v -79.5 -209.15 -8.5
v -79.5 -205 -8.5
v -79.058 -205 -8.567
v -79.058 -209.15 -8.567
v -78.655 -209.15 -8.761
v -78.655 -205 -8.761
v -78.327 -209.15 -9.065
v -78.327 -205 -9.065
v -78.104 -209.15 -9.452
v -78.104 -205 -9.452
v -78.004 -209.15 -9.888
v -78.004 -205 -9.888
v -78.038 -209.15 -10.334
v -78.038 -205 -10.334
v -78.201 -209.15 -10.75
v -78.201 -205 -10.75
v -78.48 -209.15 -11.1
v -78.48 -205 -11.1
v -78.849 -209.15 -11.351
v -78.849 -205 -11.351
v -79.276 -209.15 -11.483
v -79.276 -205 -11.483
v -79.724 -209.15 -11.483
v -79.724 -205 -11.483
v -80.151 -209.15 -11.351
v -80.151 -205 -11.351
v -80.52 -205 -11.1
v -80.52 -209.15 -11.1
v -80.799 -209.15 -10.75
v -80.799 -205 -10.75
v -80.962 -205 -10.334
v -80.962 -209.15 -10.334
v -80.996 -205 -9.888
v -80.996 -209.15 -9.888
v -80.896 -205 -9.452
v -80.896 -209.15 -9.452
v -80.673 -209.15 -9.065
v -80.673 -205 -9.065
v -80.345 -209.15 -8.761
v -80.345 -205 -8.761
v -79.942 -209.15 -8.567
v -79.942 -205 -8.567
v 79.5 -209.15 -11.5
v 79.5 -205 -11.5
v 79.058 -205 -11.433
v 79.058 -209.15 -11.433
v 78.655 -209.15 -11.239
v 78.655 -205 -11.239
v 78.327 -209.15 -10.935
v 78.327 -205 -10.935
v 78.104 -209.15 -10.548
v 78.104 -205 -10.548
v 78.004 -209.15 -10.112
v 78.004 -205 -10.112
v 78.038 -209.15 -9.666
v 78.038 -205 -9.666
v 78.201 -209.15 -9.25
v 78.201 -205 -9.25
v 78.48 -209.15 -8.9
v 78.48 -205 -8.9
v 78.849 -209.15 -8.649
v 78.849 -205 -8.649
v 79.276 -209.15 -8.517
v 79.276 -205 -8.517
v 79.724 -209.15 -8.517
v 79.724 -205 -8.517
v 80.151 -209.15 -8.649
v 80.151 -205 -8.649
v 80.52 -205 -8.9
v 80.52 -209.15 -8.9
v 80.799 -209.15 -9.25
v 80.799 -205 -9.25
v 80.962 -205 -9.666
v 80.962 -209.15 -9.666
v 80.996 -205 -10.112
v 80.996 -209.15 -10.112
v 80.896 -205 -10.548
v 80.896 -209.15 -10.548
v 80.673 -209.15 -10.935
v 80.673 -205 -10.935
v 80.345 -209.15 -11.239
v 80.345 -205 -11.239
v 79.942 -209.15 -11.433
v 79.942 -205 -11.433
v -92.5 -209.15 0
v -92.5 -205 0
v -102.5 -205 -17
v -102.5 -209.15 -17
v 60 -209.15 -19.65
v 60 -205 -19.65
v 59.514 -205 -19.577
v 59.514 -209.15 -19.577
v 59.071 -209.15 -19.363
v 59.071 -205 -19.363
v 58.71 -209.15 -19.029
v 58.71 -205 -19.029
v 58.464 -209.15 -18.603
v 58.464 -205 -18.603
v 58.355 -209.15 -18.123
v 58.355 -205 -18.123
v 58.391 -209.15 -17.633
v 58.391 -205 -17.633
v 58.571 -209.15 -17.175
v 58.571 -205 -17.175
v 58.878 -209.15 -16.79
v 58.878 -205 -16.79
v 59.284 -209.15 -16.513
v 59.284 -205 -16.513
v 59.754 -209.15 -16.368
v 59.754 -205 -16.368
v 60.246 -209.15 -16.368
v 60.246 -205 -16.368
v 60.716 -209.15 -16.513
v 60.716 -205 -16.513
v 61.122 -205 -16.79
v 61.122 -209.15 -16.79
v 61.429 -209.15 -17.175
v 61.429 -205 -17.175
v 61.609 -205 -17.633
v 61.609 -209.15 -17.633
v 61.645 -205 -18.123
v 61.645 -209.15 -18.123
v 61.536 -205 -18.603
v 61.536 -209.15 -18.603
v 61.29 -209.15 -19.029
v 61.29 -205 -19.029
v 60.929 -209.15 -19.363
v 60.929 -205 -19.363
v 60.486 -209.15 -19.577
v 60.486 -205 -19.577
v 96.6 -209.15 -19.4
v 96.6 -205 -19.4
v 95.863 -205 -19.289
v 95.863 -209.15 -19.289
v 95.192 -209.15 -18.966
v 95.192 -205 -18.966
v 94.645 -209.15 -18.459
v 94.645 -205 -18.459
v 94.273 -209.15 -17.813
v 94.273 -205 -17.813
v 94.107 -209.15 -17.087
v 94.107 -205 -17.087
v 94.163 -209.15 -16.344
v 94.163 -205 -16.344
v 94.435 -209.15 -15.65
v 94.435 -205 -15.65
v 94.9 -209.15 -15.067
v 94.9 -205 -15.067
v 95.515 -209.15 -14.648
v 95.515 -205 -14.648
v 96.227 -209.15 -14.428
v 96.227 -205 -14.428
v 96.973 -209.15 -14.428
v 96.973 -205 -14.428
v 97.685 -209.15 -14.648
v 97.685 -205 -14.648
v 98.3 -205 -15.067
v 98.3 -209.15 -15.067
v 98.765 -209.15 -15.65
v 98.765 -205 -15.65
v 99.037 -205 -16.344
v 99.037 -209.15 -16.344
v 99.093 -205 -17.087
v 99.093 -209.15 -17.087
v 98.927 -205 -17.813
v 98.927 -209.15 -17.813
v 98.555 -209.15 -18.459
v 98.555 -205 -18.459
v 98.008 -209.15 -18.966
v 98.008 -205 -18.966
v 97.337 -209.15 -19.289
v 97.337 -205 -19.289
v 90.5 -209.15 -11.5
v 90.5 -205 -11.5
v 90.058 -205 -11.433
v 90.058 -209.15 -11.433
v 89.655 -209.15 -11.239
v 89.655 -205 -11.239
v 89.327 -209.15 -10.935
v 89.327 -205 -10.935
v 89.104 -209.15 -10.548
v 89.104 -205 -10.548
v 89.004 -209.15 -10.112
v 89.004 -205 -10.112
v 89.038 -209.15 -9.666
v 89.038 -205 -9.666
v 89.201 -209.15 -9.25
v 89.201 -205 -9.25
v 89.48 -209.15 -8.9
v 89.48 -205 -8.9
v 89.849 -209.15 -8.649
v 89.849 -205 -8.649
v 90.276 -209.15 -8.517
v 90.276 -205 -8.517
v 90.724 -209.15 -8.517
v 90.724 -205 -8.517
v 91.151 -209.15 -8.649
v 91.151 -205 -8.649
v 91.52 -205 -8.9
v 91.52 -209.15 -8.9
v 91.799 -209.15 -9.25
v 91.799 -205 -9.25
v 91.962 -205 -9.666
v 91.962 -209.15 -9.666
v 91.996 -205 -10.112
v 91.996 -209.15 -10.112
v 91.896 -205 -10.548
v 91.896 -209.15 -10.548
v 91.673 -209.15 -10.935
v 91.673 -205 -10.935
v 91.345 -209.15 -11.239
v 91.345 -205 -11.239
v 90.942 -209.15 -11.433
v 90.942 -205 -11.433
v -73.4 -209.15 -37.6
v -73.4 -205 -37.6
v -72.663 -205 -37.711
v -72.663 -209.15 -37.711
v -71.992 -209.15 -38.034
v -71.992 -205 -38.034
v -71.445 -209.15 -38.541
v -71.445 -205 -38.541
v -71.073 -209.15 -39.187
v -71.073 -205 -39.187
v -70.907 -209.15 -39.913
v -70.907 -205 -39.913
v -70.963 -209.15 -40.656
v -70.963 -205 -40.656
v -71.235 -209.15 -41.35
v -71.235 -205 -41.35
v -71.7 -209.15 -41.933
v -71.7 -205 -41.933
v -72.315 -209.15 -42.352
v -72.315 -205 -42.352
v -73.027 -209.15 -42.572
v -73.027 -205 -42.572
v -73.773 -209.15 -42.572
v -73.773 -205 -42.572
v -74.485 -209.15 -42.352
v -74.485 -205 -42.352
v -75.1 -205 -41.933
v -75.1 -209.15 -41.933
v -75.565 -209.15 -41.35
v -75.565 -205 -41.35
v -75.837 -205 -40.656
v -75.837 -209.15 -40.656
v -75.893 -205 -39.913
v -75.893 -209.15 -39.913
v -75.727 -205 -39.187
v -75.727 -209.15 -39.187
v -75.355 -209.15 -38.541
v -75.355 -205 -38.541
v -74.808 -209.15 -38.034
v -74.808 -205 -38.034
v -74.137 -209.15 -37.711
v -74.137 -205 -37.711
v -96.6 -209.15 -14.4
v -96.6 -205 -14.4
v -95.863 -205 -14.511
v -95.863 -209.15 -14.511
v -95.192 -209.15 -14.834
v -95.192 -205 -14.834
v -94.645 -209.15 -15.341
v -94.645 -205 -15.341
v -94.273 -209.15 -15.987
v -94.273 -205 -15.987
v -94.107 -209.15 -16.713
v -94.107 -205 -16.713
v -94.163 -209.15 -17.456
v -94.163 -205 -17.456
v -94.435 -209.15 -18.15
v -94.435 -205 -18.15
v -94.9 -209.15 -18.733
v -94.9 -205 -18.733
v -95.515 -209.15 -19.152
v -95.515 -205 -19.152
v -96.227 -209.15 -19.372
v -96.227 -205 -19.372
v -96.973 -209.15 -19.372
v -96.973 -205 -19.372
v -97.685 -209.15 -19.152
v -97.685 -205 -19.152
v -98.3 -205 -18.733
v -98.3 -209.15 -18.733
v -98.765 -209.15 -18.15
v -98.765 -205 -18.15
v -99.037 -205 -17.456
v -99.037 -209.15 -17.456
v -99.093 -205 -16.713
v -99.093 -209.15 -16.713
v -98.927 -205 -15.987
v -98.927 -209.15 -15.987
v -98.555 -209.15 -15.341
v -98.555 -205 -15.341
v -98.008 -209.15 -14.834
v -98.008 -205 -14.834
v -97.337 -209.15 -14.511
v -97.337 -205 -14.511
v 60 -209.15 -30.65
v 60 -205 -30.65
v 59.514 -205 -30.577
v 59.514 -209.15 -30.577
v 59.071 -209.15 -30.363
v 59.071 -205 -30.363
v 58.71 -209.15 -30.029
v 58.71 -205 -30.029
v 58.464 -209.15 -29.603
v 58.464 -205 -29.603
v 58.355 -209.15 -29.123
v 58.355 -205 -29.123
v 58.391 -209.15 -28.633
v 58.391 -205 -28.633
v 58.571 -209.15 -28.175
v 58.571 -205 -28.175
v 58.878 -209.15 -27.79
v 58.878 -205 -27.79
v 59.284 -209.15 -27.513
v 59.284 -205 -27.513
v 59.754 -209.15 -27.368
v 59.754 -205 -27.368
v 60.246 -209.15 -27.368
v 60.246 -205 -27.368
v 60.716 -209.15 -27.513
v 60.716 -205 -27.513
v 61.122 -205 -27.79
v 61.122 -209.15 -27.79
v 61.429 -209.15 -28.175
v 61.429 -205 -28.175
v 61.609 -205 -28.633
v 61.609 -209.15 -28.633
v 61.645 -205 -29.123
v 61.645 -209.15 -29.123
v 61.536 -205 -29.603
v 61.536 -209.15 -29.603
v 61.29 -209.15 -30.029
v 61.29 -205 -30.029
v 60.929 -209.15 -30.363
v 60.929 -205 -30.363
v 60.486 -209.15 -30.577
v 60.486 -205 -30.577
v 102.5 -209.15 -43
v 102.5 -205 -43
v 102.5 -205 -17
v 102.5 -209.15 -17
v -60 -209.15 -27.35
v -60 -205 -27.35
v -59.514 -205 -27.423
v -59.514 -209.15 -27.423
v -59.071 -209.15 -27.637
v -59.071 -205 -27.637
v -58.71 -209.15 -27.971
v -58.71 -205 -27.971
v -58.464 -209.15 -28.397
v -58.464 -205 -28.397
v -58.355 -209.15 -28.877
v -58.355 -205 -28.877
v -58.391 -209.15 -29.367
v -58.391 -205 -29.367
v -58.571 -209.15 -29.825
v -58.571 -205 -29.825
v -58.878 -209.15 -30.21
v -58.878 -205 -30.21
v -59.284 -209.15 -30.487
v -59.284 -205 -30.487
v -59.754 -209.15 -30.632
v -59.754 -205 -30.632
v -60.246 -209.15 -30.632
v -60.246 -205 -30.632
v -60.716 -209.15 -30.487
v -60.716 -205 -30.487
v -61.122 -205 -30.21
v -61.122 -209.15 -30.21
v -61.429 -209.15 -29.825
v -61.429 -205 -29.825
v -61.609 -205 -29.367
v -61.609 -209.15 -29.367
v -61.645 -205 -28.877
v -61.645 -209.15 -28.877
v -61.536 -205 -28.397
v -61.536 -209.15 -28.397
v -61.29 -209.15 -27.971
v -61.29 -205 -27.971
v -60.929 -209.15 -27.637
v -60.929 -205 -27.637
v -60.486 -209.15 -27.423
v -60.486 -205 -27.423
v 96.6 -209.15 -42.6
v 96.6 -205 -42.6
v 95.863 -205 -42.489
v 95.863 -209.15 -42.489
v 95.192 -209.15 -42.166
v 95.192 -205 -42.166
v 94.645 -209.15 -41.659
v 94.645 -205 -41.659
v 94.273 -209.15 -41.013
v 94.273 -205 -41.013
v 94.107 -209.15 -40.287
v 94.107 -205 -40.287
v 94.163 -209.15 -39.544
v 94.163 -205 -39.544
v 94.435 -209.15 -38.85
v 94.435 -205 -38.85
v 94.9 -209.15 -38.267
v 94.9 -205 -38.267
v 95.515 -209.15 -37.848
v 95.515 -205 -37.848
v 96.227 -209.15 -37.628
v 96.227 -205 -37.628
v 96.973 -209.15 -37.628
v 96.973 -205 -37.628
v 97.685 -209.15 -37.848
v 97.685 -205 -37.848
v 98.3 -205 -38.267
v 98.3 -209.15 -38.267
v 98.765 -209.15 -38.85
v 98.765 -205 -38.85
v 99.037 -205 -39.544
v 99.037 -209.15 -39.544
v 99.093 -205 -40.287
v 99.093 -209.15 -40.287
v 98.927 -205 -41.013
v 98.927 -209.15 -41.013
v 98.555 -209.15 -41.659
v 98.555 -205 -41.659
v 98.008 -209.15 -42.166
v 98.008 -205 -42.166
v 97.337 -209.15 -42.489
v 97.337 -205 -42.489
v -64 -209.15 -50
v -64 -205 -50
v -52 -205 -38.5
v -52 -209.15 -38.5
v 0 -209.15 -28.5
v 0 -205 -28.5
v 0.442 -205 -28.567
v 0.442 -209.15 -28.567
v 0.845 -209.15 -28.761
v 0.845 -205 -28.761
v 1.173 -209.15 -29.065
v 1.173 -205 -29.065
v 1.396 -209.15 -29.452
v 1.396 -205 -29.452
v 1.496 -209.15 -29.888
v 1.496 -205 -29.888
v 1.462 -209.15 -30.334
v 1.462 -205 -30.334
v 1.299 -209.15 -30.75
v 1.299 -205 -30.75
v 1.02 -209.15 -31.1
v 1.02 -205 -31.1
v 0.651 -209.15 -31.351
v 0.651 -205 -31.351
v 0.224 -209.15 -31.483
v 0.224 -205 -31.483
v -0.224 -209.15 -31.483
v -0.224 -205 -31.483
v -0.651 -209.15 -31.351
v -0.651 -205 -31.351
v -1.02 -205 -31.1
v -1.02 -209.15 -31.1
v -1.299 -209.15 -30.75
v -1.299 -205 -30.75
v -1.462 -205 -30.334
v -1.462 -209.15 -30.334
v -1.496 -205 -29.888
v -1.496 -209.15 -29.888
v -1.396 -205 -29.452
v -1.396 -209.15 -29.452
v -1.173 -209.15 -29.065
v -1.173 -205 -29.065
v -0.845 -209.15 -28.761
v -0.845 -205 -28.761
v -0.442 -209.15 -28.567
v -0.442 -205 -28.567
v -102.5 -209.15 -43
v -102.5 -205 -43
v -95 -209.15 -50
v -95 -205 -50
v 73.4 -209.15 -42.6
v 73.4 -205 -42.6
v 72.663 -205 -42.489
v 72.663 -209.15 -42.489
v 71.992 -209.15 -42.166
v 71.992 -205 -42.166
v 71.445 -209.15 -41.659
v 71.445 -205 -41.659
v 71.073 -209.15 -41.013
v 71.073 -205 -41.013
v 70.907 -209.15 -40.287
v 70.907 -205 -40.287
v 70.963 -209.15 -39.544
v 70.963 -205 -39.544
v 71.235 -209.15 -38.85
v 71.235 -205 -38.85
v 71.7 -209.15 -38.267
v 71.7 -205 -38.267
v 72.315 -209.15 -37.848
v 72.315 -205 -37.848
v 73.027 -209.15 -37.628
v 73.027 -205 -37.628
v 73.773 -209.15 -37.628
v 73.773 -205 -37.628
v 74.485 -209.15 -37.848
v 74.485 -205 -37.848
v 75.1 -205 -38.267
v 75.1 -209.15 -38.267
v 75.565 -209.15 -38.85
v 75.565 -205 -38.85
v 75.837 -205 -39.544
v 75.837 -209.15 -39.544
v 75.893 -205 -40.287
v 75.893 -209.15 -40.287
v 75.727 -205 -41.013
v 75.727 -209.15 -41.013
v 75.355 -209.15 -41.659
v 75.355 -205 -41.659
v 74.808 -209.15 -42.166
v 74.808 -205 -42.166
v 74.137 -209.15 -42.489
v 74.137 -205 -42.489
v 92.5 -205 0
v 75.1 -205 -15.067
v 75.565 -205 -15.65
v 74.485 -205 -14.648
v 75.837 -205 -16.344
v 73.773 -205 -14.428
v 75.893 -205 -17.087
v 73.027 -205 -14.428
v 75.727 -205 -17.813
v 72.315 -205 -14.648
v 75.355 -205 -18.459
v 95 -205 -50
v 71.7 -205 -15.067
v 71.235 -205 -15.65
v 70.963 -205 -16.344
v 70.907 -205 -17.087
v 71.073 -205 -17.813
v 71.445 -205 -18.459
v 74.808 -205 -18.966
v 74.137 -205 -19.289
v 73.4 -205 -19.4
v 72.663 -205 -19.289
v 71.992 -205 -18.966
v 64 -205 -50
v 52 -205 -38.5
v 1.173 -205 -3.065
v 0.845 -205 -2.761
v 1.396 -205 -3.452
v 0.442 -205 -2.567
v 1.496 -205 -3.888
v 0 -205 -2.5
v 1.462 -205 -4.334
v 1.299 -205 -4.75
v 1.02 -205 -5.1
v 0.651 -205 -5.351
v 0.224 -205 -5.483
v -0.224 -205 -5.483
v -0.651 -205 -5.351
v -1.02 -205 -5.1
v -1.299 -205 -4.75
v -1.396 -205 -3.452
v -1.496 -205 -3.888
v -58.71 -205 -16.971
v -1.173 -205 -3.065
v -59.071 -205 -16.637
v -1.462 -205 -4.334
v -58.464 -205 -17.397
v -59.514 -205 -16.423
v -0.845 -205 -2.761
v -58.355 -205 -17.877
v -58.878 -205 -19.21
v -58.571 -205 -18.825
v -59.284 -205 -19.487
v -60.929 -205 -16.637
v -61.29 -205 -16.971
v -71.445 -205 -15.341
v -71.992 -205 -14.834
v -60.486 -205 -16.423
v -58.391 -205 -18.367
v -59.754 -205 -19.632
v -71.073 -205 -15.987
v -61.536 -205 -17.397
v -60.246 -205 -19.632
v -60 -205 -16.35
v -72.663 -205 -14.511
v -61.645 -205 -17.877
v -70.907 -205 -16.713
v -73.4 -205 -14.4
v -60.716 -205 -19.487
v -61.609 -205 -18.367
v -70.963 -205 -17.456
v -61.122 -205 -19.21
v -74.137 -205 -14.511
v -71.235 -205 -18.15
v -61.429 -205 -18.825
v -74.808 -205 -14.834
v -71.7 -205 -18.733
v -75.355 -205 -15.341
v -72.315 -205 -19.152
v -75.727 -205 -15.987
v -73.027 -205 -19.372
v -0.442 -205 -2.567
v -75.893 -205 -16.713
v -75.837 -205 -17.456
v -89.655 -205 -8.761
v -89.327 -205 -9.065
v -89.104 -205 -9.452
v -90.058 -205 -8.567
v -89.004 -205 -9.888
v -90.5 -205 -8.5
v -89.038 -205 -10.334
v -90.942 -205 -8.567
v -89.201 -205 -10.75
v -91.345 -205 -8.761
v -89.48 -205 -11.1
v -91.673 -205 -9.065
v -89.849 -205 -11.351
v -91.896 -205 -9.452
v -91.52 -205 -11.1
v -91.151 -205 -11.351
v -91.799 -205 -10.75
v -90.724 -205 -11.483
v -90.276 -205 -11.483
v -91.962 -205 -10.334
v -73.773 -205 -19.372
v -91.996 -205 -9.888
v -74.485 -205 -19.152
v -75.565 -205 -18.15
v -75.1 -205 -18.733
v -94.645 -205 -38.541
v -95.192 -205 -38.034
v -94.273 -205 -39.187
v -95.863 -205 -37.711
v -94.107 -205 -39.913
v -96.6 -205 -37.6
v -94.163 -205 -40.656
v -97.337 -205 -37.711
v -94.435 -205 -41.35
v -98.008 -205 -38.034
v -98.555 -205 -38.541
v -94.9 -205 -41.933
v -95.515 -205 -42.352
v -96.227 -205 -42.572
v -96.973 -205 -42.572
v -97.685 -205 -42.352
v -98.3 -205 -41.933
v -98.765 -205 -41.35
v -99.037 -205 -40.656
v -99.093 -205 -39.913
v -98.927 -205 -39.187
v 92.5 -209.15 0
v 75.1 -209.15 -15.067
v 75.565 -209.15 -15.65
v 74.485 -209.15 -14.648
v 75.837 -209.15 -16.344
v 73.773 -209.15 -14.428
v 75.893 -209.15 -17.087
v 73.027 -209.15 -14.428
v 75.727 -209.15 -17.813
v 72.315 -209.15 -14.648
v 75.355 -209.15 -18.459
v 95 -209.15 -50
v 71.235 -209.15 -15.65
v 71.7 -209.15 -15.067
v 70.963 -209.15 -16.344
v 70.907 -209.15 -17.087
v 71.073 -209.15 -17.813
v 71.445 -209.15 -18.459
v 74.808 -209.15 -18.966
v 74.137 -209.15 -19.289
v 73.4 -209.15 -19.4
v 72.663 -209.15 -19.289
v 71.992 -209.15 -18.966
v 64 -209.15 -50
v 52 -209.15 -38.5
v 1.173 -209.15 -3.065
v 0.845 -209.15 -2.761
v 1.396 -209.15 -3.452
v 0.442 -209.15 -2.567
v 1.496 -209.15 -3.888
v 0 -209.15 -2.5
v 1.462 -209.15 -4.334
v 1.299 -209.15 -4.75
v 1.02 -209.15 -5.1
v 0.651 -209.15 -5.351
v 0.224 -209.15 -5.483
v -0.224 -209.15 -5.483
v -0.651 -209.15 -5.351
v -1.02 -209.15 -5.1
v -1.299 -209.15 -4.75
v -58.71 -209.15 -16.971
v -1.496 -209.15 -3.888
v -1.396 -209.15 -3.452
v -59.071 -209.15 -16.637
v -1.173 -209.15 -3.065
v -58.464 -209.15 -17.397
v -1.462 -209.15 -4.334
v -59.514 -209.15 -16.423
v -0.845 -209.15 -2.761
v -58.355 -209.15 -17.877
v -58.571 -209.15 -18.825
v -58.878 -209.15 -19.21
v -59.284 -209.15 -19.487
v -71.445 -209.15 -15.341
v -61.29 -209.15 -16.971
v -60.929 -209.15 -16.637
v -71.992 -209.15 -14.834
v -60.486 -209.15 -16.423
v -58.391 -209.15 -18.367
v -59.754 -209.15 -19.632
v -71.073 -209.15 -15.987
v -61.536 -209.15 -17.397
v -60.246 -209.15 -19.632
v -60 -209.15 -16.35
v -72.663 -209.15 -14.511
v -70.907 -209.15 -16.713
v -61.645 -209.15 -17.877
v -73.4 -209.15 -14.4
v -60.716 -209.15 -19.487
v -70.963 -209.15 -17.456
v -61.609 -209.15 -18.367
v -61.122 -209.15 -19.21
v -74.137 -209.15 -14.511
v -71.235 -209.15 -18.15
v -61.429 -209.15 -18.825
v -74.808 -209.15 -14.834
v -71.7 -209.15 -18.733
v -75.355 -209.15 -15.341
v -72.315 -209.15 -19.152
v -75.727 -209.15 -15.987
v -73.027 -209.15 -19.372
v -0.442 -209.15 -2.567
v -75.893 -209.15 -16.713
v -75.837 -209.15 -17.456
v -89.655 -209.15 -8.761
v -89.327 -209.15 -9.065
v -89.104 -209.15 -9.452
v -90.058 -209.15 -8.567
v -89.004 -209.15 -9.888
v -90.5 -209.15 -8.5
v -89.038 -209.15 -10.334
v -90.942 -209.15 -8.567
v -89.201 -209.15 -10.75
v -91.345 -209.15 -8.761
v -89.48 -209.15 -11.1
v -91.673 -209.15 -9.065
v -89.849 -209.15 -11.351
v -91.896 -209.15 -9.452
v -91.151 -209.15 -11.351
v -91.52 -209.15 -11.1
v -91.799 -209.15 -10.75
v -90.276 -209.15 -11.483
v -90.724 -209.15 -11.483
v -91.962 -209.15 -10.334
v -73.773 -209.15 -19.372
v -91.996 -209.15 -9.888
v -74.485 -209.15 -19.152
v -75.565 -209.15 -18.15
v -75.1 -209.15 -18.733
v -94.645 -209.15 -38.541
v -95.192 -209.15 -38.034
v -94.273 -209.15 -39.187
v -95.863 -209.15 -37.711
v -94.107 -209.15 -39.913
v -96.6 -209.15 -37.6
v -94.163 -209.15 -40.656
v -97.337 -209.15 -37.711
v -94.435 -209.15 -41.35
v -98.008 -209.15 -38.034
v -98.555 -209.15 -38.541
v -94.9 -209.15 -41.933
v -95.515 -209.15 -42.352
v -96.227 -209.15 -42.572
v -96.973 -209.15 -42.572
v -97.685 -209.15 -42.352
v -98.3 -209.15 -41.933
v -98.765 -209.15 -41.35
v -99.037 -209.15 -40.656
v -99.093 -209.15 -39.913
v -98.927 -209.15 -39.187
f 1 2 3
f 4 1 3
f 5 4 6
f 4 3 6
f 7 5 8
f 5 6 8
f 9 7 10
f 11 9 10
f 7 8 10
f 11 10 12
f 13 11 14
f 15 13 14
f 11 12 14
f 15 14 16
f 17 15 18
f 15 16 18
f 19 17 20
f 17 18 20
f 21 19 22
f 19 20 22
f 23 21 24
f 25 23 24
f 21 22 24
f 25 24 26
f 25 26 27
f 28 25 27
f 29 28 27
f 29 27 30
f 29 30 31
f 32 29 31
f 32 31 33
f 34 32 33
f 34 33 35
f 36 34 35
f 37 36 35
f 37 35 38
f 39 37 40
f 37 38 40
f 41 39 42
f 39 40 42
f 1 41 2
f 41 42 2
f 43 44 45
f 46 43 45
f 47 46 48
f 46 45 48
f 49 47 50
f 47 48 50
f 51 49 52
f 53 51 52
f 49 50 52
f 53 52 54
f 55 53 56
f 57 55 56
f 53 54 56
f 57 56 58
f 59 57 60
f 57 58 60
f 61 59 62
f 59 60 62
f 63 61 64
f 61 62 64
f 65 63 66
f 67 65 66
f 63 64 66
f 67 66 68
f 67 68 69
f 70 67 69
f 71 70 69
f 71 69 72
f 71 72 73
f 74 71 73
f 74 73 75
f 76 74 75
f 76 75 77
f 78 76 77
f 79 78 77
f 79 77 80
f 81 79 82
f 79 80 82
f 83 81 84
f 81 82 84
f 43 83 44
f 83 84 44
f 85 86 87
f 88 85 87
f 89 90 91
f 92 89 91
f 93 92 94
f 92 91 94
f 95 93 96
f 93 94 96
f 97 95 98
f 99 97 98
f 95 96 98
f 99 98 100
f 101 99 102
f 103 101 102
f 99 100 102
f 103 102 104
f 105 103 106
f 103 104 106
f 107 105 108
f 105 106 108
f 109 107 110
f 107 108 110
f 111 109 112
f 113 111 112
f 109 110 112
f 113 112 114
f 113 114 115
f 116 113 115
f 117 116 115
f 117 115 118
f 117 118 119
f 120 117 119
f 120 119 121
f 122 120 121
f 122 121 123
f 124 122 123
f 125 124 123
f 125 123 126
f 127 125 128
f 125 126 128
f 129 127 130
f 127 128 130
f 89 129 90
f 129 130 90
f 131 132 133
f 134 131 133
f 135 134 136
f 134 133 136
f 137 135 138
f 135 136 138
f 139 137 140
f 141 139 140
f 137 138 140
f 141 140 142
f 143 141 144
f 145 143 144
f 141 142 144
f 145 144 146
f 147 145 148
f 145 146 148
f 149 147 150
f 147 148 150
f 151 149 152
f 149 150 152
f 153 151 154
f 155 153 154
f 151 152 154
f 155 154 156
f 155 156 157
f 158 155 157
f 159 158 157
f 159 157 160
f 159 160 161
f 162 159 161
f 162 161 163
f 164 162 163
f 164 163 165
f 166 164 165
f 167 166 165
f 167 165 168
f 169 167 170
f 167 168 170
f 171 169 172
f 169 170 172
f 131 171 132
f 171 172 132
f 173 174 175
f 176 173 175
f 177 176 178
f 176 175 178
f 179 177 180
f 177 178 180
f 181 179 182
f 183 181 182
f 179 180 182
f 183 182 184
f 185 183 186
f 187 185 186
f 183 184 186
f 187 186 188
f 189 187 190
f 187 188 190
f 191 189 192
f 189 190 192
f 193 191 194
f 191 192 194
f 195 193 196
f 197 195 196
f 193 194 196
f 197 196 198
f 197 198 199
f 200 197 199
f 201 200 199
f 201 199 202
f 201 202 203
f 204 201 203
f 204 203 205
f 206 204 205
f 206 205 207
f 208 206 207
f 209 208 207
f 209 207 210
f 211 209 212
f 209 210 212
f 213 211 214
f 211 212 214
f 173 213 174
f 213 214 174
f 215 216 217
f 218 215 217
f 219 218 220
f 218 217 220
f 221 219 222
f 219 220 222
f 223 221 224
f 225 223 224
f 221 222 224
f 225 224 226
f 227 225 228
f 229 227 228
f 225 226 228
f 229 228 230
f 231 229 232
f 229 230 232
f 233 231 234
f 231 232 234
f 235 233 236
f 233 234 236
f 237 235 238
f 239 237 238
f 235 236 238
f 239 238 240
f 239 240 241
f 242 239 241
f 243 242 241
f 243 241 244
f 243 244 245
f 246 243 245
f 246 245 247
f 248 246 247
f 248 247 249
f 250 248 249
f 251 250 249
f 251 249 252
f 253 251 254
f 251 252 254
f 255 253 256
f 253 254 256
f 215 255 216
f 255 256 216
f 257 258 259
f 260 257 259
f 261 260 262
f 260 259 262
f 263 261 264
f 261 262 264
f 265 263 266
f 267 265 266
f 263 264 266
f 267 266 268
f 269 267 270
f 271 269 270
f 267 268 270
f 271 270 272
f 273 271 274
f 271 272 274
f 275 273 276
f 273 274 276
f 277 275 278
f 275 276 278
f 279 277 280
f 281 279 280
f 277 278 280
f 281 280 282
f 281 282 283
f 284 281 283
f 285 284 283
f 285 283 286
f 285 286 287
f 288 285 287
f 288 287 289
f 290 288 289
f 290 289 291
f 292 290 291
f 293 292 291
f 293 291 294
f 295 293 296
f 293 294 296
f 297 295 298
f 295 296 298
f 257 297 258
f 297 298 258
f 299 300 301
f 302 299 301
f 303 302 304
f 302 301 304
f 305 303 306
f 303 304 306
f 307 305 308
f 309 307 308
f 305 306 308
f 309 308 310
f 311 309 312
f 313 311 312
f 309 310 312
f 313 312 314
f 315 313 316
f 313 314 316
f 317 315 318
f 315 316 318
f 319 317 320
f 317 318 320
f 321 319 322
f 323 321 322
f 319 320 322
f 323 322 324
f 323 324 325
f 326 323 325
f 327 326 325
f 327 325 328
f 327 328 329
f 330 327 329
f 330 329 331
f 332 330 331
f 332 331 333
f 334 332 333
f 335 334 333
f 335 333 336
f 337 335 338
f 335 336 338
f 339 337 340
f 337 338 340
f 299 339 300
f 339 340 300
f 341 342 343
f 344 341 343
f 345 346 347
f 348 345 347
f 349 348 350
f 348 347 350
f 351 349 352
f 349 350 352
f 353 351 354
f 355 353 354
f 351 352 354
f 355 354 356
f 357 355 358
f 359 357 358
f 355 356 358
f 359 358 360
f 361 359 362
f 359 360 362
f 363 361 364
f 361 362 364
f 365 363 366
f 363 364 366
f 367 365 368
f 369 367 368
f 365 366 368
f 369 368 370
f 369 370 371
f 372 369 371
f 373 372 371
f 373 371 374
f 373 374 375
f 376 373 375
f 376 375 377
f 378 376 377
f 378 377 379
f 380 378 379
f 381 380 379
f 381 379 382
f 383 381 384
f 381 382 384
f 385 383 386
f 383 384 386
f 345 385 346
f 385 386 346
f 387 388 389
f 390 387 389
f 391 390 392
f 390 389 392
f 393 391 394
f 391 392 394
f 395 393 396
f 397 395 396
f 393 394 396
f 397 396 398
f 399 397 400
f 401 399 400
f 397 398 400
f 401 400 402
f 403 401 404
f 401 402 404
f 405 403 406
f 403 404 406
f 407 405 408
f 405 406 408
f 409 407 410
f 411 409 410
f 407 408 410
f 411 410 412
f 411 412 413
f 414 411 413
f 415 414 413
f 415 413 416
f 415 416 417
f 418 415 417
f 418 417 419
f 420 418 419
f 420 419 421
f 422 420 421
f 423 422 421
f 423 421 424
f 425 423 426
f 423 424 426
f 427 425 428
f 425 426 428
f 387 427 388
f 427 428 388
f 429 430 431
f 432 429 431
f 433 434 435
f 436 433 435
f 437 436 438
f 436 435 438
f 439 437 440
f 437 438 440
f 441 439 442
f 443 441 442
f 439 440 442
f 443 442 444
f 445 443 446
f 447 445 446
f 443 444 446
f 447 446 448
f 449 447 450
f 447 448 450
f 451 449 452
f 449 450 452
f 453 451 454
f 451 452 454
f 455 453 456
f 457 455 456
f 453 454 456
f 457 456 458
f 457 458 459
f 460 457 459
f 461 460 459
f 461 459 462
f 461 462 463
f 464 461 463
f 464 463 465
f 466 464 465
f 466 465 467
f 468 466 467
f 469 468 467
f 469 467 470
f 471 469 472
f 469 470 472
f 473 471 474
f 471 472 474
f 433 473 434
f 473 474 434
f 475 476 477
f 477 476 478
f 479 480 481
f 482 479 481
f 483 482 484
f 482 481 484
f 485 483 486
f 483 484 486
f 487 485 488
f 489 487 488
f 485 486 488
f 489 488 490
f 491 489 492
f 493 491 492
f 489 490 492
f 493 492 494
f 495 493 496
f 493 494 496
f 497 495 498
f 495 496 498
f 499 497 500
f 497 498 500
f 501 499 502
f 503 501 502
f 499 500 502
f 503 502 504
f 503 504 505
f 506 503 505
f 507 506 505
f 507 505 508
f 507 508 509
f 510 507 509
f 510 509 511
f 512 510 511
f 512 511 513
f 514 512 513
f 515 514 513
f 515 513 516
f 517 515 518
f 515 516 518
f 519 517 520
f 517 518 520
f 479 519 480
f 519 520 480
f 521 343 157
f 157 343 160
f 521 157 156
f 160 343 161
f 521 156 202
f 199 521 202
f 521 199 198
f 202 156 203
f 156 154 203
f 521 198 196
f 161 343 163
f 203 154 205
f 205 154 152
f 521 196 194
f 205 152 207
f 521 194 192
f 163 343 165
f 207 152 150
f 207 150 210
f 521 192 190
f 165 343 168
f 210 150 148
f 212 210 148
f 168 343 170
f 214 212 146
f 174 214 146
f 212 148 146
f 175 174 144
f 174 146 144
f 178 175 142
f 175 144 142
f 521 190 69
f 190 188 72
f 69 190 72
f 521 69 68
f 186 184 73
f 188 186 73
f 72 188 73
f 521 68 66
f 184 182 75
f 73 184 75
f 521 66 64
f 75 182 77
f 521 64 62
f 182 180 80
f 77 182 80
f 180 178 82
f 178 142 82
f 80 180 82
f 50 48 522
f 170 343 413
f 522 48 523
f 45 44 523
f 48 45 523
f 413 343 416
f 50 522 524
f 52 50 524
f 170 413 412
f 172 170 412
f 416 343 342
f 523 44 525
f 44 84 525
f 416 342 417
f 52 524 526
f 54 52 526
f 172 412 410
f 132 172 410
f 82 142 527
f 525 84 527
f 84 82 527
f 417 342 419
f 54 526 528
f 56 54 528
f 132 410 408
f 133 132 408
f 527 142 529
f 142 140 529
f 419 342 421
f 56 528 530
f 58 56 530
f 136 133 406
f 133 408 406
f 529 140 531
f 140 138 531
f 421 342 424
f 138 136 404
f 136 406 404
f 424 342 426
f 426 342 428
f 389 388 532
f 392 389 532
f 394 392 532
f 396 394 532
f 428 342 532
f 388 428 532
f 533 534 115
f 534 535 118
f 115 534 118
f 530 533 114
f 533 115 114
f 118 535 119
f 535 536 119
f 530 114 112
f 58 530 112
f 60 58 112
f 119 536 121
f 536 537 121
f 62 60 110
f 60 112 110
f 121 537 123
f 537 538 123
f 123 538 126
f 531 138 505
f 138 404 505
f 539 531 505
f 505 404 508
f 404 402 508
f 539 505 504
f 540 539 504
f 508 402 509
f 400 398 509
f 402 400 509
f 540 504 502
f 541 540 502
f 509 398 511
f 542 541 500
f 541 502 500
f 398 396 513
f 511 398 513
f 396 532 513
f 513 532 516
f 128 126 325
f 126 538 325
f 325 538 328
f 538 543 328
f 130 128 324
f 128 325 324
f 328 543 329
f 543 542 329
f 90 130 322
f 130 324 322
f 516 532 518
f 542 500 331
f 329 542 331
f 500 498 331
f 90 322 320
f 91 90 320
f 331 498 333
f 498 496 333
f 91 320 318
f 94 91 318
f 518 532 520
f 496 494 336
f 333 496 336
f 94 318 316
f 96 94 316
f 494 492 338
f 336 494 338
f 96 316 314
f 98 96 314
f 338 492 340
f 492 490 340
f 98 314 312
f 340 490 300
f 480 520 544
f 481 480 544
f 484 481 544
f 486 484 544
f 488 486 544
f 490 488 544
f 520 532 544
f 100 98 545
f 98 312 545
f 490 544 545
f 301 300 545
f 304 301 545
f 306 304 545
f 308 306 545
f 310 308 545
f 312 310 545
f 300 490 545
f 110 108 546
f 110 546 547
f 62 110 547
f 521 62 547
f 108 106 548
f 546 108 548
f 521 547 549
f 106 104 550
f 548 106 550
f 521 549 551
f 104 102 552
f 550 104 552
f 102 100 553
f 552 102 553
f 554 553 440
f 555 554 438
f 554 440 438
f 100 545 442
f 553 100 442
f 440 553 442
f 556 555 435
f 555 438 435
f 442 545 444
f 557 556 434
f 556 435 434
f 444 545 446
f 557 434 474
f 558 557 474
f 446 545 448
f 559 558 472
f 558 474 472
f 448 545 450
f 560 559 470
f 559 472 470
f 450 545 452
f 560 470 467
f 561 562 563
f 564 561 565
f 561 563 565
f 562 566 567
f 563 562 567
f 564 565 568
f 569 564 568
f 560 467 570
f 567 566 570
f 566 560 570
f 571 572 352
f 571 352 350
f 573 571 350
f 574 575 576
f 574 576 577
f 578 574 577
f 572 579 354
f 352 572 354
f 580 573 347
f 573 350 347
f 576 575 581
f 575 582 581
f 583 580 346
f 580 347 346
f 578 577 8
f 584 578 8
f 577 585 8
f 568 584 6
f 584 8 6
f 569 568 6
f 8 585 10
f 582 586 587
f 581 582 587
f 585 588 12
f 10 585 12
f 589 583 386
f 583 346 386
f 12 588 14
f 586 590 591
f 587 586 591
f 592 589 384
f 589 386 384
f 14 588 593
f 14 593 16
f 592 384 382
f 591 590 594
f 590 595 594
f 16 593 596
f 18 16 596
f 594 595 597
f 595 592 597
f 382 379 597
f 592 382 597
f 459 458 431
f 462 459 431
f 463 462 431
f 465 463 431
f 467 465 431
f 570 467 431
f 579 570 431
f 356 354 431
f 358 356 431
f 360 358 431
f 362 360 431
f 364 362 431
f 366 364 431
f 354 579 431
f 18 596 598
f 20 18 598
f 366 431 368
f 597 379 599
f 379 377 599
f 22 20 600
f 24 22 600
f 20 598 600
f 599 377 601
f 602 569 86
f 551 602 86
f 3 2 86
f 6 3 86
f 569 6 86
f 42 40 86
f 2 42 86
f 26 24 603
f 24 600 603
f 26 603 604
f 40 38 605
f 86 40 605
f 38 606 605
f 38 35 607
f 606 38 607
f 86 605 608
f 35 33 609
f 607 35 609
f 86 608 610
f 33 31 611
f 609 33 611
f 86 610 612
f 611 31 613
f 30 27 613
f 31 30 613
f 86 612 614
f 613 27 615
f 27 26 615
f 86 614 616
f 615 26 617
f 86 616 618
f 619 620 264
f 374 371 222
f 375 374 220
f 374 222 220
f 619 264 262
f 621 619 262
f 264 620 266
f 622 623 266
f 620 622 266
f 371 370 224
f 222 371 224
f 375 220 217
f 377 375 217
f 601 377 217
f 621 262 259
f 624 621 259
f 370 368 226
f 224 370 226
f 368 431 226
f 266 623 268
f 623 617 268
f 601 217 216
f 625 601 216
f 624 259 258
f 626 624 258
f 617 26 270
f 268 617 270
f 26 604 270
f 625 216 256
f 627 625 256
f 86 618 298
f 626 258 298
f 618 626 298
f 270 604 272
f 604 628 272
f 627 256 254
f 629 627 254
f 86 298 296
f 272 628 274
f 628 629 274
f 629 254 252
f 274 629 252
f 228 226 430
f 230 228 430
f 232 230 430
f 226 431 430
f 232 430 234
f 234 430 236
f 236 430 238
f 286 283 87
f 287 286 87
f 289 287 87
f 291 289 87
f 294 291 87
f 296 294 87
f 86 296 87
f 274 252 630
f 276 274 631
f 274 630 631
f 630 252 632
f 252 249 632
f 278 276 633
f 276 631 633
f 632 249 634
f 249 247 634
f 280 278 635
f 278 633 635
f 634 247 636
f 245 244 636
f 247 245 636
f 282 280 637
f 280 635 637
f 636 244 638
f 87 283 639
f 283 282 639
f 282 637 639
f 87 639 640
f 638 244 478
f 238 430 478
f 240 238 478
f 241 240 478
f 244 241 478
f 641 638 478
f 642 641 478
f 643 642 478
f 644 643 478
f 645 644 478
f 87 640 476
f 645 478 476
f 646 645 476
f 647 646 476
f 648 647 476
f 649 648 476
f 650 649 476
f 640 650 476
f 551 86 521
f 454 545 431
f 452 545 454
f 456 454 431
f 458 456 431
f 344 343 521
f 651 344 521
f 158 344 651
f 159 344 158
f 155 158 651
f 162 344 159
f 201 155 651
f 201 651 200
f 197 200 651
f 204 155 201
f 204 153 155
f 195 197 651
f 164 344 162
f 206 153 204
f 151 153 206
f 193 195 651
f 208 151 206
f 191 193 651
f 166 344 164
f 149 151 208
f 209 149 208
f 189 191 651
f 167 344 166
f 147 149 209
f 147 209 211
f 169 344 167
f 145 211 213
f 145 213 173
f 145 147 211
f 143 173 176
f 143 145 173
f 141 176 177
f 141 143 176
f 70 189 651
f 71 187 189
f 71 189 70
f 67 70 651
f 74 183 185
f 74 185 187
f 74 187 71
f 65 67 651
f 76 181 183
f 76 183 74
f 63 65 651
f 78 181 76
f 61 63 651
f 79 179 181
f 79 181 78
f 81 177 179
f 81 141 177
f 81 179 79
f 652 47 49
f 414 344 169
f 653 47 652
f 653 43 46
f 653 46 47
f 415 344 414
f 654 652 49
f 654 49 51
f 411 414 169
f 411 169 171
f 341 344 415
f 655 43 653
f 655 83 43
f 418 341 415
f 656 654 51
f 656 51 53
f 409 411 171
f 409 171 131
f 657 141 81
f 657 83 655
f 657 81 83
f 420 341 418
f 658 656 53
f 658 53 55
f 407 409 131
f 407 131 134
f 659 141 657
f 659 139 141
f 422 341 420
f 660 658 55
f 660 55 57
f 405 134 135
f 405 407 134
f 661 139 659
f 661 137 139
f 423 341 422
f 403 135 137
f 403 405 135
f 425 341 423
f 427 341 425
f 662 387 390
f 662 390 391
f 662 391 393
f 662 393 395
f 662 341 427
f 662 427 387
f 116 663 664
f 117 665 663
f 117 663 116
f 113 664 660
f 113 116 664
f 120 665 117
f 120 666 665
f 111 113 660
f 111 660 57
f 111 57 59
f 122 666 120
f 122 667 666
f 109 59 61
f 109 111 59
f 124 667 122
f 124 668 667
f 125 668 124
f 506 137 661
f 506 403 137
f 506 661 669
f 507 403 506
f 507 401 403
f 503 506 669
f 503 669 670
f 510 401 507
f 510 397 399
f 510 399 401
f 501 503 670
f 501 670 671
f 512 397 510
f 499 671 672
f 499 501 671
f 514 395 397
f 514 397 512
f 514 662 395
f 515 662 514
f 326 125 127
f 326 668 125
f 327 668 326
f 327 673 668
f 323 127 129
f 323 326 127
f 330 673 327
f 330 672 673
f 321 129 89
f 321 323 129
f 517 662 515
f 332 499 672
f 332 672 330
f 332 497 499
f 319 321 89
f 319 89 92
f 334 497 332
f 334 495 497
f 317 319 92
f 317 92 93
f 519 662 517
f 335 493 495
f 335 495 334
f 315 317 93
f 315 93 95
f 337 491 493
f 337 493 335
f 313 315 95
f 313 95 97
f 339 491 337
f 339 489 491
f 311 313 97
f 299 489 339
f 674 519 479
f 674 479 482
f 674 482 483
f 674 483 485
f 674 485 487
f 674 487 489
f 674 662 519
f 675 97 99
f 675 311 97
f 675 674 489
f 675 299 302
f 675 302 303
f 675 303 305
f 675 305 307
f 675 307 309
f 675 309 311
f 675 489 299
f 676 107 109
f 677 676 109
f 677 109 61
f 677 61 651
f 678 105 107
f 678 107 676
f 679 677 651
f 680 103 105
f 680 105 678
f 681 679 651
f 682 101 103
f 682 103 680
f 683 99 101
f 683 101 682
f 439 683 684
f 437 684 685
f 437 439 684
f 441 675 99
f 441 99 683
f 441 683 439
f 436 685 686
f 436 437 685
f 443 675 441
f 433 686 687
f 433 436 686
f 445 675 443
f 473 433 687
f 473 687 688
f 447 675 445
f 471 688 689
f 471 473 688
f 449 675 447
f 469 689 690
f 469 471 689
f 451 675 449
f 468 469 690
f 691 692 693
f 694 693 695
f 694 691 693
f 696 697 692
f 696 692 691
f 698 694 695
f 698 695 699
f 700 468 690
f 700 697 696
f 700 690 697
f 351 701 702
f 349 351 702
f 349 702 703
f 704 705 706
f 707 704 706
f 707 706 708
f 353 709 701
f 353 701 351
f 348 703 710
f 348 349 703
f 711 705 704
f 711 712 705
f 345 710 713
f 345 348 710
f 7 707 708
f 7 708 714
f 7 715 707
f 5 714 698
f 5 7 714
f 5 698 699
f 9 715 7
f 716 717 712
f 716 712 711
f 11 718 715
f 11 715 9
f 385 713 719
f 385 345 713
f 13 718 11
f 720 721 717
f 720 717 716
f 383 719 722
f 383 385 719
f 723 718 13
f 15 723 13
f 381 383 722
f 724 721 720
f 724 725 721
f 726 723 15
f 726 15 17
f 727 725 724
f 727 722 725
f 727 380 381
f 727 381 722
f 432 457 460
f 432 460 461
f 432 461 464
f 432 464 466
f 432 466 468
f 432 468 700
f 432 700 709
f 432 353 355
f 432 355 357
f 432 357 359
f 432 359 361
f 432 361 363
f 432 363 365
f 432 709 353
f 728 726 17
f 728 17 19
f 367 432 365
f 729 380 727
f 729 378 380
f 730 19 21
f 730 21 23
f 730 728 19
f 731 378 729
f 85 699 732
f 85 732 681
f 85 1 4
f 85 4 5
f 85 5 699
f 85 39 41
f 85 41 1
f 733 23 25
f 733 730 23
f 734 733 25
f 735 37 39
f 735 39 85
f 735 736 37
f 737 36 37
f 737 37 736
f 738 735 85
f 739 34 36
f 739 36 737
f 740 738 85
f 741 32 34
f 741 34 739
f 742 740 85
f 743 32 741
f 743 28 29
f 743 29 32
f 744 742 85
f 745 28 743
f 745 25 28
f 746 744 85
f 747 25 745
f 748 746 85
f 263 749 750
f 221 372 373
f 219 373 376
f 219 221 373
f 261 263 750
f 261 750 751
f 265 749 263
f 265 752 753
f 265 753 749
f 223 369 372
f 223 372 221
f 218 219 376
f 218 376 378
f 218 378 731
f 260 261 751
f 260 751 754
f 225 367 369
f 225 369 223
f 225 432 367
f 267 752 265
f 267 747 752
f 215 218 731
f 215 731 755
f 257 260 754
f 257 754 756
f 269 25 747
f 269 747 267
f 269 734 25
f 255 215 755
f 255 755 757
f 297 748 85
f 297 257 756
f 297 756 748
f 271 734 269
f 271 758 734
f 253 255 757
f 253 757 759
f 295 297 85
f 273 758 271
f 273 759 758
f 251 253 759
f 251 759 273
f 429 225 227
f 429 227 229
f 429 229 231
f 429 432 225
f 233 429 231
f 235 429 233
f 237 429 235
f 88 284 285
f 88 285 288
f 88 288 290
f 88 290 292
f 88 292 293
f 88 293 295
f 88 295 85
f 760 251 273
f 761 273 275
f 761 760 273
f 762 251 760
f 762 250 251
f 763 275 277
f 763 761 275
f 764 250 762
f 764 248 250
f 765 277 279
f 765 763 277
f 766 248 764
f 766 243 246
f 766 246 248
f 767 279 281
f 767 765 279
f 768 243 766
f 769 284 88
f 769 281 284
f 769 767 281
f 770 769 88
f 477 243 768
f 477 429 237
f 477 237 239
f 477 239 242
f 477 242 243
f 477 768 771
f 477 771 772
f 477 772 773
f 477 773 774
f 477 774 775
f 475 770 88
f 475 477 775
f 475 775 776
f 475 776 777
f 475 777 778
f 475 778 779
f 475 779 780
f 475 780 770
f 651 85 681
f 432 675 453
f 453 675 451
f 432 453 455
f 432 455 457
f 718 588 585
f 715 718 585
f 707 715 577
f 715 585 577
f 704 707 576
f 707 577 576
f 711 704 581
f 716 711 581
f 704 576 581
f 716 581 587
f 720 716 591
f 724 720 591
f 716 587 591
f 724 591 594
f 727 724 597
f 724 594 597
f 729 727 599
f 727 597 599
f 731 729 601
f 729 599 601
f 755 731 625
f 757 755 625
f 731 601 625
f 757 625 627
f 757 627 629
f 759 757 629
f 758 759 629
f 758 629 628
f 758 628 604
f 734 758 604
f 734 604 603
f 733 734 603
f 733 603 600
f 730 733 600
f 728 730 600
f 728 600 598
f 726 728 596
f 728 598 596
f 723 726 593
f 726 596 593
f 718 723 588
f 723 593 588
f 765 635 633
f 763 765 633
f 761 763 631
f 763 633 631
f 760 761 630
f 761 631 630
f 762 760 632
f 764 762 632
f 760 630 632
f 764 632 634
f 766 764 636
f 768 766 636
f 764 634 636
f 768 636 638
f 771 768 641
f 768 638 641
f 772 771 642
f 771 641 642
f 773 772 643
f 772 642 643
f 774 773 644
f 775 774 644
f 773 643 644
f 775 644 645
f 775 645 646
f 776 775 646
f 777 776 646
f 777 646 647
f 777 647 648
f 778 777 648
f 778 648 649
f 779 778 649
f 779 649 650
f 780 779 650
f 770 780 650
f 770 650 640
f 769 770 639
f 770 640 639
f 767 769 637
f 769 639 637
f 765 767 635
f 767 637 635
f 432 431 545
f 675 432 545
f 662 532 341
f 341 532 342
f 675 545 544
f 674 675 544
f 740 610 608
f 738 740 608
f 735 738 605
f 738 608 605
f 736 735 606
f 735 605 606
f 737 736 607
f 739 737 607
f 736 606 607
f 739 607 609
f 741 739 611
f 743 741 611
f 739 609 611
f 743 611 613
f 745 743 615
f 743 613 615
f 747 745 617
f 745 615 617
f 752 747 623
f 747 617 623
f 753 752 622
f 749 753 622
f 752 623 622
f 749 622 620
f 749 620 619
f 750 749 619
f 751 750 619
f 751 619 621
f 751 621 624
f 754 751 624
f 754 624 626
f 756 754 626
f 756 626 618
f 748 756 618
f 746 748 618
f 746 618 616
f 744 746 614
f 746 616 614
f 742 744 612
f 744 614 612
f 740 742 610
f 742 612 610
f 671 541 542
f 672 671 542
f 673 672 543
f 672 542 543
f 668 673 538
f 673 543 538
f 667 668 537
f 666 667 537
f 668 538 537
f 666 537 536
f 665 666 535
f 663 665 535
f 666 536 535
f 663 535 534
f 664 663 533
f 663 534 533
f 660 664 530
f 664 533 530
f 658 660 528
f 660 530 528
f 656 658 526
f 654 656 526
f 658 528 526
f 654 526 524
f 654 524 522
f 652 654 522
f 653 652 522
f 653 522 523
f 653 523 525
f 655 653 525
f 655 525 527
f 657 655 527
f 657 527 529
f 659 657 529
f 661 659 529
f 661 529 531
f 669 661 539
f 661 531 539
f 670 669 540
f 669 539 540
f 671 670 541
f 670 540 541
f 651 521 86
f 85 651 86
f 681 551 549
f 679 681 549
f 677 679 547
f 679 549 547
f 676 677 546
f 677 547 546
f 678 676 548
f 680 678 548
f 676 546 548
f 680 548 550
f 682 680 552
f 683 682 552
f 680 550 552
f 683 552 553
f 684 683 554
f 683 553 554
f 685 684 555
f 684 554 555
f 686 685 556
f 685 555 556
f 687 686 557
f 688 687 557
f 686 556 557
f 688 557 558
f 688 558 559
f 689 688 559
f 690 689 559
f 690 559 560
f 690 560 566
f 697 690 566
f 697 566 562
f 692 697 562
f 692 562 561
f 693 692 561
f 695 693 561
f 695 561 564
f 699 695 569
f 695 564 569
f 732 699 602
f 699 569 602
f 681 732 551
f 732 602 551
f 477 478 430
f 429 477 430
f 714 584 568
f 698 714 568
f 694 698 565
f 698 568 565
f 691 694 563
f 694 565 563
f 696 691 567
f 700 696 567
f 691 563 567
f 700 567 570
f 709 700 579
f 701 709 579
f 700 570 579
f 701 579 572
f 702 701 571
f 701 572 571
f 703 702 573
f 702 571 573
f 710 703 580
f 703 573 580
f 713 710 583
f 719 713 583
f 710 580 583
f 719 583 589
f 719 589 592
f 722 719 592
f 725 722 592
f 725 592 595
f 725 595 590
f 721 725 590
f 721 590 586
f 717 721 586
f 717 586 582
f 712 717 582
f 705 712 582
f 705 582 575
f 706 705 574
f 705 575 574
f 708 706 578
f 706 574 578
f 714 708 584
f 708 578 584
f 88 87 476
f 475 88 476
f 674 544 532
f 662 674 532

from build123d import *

# Parameters (mm, degrees)
SKETCH1_R           = 2.5
SKETCH1_R_2         = 1.5
SKETCH1_R_3         = 1.65
BOSS_EXTRUDE1_DEPTH = 4.15


with BuildPart() as part:
    # Sketch1 → Boss-Extrude1 (new body)
    with BuildSketch(Plane(origin=(0, -205, 0), x_dir=(1, 0, 0), z_dir=(0, 1, 0))):
        Polygon((52, 38.5), (64, 50), (95, 50), (102.5, 43), (102.5, 17), (92.5, 0), (-92.5, 0), (-102.5, 17), (-102.5, 43), (-95, 50), (-64, 50), (-52, 38.5), align=None)
        with Locations(Location((-96.6, 40.1, 0), (0, 0, 270))):  # turned: the seam where the file's is
            Circle(SKETCH1_R, mode=Mode.SUBTRACT)
        with Locations(Location((-73.4, 40.1, 0), (0, 0, 270))):  # turned: the seam where the file's is
            Circle(SKETCH1_R, mode=Mode.SUBTRACT)
        with Locations(Location((-96.6, 16.9, 0), (0, 0, 270))):  # turned: the seam where the file's is
            Circle(SKETCH1_R, mode=Mode.SUBTRACT)
        with Locations(Location((-73.4, 16.9, 0), (0, 0, 270))):  # turned: the seam where the file's is
            Circle(SKETCH1_R, mode=Mode.SUBTRACT)
        with Locations(Location((-90.5, 10, 0), (0, 0, 270))):  # turned: the seam where the file's is
            Circle(SKETCH1_R_2, mode=Mode.SUBTRACT)
        with Locations(Location((-79.5, 10, 0), (0, 0, 270))):  # turned: the seam where the file's is
            Circle(SKETCH1_R_2, mode=Mode.SUBTRACT)
        with Locations(Location((-60, 29, 0), (0, 0, 270))):  # turned: the seam where the file's is
            Circle(SKETCH1_R_3, mode=Mode.SUBTRACT)
        with Locations(Location((-60, 18, 0), (0, 0, 270))):  # turned: the seam where the file's is
            Circle(SKETCH1_R_3, mode=Mode.SUBTRACT)
        with Locations(Location((0, 30, 0), (0, 0, 270))):  # turned: the seam where the file's is
            Circle(SKETCH1_R_2, mode=Mode.SUBTRACT)
        with Locations(Location((0, 4, 0), (0, 0, 270))):  # turned: the seam where the file's is
            Circle(SKETCH1_R_2, mode=Mode.SUBTRACT)
        with Locations(Location((73.4, 40.1, 0), (0, 0, 90))):  # turned: the seam where the file's is
            Circle(SKETCH1_R, mode=Mode.SUBTRACT)
        with Locations(Location((60, 29, 0), (0, 0, 90))):  # turned: the seam where the file's is
            Circle(SKETCH1_R_3, mode=Mode.SUBTRACT)
        with Locations(Location((60, 18, 0), (0, 0, 90))):  # turned: the seam where the file's is
            Circle(SKETCH1_R_3, mode=Mode.SUBTRACT)
        with Locations(Location((73.4, 16.9, 0), (0, 0, 90))):  # turned: the seam where the file's is
            Circle(SKETCH1_R, mode=Mode.SUBTRACT)
        with Locations(Location((79.5, 10, 0), (0, 0, 90))):  # turned: the seam where the file's is
            Circle(SKETCH1_R_2, mode=Mode.SUBTRACT)
        with Locations(Location((90.5, 10, 0), (0, 0, 90))):  # turned: the seam where the file's is
            Circle(SKETCH1_R_2, mode=Mode.SUBTRACT)
        with Locations(Location((96.6, 16.9, 0), (0, 0, 90))):  # turned: the seam where the file's is
            Circle(SKETCH1_R, mode=Mode.SUBTRACT)
        with Locations(Location((96.6, 40.1, 0), (0, 0, 90))):  # turned: the seam where the file's is
            Circle(SKETCH1_R, mode=Mode.SUBTRACT)
    extrude(amount=-BOSS_EXTRUDE1_DEPTH)


solid = part.part
